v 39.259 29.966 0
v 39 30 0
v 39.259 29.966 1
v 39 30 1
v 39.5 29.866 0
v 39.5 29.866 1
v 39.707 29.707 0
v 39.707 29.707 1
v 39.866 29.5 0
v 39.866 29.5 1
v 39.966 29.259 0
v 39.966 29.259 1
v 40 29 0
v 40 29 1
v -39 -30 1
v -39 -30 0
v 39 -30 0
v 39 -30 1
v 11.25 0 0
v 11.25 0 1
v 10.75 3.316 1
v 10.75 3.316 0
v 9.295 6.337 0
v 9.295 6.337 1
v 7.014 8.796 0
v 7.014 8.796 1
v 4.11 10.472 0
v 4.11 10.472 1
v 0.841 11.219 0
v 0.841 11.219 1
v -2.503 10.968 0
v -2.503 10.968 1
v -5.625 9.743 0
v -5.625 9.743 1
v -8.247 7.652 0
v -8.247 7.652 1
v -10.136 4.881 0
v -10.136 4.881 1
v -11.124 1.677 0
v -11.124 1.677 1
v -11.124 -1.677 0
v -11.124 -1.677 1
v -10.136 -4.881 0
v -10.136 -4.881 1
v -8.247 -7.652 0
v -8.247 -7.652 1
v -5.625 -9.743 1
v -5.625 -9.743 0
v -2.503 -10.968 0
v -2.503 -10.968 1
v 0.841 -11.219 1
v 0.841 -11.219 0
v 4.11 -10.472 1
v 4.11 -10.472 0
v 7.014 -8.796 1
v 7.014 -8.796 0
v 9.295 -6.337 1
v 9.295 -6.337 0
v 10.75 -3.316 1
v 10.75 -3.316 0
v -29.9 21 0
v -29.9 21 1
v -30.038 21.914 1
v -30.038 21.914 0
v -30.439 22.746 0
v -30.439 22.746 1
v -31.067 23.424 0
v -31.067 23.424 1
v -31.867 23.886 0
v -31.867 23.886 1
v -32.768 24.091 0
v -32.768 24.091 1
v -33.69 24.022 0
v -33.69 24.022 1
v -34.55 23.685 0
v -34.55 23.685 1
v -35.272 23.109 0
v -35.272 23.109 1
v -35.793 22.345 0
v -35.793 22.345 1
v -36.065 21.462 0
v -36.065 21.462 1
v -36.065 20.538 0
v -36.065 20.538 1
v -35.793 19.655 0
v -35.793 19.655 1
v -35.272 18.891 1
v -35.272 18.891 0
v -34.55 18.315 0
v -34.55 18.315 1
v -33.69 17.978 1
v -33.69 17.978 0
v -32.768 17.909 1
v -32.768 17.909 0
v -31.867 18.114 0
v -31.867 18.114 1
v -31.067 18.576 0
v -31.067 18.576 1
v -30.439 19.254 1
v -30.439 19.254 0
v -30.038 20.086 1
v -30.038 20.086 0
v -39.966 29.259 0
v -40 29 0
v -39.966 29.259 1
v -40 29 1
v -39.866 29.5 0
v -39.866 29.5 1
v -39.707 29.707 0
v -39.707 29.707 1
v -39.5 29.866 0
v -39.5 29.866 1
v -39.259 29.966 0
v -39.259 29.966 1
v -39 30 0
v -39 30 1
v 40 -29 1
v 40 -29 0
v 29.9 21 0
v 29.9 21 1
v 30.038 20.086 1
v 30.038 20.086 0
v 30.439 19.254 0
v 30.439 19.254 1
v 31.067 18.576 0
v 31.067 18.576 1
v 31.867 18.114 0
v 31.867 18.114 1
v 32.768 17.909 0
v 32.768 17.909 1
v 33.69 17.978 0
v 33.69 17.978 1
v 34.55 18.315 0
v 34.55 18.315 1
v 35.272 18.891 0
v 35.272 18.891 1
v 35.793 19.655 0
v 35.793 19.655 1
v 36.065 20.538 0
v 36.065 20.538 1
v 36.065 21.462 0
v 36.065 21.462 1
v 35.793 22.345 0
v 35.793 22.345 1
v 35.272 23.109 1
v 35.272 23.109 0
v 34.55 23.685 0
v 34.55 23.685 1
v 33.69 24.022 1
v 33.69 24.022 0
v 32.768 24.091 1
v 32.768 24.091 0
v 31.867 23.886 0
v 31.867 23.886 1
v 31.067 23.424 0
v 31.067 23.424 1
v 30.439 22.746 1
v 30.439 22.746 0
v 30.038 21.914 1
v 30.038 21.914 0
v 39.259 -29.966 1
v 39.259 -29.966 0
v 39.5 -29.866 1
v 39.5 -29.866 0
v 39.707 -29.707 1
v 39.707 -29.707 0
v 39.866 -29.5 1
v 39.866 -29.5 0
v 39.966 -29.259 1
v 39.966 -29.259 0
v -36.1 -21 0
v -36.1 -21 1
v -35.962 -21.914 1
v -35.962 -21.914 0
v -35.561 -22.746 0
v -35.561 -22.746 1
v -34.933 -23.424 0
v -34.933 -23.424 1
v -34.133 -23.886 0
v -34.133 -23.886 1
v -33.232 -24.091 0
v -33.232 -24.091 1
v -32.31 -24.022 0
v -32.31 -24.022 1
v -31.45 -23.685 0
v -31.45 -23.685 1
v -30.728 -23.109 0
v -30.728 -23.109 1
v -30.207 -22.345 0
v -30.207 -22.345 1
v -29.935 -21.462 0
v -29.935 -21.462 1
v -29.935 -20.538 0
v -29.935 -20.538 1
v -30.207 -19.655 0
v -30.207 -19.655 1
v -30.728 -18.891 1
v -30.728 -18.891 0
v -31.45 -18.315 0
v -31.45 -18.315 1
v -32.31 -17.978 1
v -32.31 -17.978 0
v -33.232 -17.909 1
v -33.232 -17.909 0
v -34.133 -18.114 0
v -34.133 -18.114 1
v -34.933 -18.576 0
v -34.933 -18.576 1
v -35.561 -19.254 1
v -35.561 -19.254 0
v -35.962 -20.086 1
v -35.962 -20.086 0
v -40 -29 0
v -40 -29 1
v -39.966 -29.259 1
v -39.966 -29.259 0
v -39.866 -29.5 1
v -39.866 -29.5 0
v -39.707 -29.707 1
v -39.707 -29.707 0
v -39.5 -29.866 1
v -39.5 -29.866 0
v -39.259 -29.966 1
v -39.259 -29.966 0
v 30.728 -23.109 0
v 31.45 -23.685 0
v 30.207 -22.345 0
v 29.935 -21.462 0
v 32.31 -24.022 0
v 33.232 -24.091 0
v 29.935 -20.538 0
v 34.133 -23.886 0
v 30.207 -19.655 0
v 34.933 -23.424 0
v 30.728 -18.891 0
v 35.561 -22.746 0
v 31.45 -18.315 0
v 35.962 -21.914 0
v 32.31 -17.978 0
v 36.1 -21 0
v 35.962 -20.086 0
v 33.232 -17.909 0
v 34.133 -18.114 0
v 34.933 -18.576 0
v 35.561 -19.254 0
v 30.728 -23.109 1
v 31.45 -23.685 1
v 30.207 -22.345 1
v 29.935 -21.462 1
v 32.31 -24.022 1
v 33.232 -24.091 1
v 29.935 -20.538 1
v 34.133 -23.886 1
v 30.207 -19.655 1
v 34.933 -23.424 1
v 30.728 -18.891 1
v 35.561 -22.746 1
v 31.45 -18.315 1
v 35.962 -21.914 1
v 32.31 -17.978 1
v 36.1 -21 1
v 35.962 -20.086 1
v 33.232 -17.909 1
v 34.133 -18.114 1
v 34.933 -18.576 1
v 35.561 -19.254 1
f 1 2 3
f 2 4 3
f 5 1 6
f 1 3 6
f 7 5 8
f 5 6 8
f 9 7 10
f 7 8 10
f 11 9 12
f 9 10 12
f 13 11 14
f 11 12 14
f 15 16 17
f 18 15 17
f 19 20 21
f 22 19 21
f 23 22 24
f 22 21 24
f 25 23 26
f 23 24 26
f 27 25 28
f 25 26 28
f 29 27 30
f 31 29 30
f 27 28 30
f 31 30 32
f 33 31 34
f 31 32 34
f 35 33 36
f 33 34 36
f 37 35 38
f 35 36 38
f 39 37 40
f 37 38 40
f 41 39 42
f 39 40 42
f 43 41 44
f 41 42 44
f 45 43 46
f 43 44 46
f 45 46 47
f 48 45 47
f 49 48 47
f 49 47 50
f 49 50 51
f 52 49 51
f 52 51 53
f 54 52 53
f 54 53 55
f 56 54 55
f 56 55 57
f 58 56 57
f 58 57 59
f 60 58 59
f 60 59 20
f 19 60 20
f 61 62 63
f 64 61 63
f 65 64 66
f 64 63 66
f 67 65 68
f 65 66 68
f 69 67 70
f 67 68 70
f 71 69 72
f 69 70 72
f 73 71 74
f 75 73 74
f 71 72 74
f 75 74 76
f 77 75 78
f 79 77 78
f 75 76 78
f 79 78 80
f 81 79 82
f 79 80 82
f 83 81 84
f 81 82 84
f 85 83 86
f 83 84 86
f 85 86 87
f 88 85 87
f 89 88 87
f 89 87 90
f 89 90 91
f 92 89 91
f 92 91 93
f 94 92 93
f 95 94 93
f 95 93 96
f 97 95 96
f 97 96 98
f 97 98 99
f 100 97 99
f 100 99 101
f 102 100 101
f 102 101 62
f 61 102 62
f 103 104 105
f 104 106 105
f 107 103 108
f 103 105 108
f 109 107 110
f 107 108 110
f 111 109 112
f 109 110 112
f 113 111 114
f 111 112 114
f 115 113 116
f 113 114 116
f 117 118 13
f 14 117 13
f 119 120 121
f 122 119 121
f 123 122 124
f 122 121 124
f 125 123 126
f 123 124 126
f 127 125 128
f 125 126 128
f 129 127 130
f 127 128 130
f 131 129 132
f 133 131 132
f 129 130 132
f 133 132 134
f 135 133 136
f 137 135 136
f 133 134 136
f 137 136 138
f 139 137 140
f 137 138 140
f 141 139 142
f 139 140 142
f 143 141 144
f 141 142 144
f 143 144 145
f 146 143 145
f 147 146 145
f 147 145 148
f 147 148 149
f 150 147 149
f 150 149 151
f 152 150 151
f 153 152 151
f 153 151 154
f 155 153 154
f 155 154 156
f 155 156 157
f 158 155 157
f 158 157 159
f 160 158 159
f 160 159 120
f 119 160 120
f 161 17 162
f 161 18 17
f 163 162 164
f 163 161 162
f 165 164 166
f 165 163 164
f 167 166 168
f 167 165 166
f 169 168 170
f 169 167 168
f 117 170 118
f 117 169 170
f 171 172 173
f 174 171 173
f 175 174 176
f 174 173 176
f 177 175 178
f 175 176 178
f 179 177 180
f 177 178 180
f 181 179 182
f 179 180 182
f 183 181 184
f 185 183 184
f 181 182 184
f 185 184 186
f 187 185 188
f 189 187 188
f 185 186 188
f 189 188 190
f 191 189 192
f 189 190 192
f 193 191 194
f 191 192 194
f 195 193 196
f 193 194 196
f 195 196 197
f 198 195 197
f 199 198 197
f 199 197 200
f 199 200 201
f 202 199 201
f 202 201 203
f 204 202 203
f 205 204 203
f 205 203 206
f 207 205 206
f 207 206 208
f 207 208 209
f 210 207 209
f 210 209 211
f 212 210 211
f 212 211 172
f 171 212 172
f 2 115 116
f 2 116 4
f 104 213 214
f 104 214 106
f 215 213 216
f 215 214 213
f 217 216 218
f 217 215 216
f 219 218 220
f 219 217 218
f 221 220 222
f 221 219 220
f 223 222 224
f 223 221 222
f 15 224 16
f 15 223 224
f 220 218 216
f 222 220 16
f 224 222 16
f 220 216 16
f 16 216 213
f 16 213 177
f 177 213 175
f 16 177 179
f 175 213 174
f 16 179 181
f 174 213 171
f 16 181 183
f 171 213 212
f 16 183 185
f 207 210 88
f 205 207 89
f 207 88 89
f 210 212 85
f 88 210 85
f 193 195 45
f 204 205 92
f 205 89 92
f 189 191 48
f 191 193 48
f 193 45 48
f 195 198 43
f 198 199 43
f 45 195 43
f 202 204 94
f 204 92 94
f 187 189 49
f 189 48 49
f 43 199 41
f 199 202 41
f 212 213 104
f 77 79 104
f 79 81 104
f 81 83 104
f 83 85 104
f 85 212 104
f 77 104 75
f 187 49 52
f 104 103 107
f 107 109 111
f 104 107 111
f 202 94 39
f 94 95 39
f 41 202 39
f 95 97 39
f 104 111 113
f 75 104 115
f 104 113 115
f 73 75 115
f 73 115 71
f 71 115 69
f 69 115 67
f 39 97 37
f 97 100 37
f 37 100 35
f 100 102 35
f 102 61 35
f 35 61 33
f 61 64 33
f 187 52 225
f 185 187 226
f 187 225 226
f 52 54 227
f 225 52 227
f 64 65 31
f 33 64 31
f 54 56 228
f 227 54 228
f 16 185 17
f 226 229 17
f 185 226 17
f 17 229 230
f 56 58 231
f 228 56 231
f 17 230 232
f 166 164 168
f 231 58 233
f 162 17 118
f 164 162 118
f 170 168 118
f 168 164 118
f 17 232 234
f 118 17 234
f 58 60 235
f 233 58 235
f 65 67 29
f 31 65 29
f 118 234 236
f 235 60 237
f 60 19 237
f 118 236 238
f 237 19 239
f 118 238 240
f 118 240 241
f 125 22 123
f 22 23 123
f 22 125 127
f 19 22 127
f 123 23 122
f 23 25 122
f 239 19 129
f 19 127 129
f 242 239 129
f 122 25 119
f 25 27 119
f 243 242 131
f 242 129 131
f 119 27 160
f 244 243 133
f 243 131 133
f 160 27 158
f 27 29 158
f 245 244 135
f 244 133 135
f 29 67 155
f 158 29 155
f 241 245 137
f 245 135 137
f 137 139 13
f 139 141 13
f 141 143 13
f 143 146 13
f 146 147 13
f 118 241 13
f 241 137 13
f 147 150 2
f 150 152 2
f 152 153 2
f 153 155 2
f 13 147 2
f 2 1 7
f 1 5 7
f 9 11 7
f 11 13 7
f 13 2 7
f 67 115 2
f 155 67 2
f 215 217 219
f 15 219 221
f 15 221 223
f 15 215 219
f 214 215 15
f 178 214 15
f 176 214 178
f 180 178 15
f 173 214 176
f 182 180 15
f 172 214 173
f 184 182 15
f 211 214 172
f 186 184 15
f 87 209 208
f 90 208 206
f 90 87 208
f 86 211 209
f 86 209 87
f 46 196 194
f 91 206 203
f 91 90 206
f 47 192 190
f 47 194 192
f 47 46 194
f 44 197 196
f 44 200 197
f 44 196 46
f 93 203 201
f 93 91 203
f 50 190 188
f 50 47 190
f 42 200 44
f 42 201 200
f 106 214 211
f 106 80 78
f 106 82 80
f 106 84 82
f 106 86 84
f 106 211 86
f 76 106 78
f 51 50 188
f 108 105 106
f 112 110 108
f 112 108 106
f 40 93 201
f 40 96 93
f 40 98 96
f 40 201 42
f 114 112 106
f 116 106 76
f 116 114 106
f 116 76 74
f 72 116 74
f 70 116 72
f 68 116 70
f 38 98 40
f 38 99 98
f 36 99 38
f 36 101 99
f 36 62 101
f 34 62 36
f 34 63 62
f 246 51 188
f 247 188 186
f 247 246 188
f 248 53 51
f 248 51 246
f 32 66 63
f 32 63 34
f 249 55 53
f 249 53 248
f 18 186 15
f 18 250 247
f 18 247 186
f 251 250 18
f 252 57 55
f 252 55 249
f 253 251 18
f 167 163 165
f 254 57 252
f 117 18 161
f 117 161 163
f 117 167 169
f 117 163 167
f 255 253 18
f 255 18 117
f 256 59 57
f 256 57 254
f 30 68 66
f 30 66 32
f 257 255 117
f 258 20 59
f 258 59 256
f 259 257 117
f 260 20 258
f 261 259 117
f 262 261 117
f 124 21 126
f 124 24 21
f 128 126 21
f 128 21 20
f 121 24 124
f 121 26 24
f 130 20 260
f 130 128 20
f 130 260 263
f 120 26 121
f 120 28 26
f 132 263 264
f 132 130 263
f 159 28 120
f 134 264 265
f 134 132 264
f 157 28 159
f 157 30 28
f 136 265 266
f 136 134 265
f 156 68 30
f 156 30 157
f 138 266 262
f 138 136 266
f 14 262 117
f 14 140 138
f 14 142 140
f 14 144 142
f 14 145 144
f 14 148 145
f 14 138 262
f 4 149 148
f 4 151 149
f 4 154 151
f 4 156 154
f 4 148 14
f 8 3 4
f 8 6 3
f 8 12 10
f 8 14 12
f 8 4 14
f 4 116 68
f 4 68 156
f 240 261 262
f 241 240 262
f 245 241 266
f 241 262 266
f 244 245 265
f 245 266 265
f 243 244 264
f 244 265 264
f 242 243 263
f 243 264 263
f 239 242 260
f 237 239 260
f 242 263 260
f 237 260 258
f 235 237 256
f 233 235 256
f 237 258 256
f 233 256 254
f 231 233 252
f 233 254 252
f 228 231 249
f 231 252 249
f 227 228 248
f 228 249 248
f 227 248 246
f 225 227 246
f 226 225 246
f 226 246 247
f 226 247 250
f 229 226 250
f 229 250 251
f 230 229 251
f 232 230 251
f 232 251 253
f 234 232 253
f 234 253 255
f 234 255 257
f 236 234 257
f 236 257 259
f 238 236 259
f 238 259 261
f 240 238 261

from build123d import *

# Parameters (mm, degrees)
SKETCH1_W           = 80
SKETCH1_H           = 60
BOSS_EXTRUDE1_DEPTH = 1
SKETCH2_R           = 3.1
SKETCH2_R_2         = 11.25
CUT_EXTRUDE1_DEPTH  = 10
FILLET1_R           = 1


with BuildPart() as part:
    # Sketch1 → Boss-Extrude1 (new body)
    with BuildSketch(Plane.XY):
        Rectangle(SKETCH1_W, SKETCH1_H)
    extrude(amount=BOSS_EXTRUDE1_DEPTH)

    # Sketch2 → Cut-Extrude1 (cut)
    with BuildSketch(Plane.XY.offset(1)):
        with Locations((-33, 21)):
            Circle(SKETCH2_R)
        with Locations(Location((33, 21, 0), (0, 0, 180))):
            Circle(SKETCH2_R)
        with Locations((33, -21)):
            Circle(SKETCH2_R)
        with Locations(Location((-33, -21, 0), (0, 0, 180))):
            Circle(SKETCH2_R)
        Circle(SKETCH2_R_2)
    extrude(amount=-CUT_EXTRUDE1_DEPTH, mode=Mode.SUBTRACT)

    # Fillet1
    fillet1_edges = [part.edges().sort_by_distance(p)[0] for p in [
        (-40, 30, 0.5),
        (40, 30, 0.5),
        (40, -30, 0.5),
        (-40, -30, 0.5),
    ]]
    fillet(fillet1_edges, radius=FILLET1_R)


solid = part.part
